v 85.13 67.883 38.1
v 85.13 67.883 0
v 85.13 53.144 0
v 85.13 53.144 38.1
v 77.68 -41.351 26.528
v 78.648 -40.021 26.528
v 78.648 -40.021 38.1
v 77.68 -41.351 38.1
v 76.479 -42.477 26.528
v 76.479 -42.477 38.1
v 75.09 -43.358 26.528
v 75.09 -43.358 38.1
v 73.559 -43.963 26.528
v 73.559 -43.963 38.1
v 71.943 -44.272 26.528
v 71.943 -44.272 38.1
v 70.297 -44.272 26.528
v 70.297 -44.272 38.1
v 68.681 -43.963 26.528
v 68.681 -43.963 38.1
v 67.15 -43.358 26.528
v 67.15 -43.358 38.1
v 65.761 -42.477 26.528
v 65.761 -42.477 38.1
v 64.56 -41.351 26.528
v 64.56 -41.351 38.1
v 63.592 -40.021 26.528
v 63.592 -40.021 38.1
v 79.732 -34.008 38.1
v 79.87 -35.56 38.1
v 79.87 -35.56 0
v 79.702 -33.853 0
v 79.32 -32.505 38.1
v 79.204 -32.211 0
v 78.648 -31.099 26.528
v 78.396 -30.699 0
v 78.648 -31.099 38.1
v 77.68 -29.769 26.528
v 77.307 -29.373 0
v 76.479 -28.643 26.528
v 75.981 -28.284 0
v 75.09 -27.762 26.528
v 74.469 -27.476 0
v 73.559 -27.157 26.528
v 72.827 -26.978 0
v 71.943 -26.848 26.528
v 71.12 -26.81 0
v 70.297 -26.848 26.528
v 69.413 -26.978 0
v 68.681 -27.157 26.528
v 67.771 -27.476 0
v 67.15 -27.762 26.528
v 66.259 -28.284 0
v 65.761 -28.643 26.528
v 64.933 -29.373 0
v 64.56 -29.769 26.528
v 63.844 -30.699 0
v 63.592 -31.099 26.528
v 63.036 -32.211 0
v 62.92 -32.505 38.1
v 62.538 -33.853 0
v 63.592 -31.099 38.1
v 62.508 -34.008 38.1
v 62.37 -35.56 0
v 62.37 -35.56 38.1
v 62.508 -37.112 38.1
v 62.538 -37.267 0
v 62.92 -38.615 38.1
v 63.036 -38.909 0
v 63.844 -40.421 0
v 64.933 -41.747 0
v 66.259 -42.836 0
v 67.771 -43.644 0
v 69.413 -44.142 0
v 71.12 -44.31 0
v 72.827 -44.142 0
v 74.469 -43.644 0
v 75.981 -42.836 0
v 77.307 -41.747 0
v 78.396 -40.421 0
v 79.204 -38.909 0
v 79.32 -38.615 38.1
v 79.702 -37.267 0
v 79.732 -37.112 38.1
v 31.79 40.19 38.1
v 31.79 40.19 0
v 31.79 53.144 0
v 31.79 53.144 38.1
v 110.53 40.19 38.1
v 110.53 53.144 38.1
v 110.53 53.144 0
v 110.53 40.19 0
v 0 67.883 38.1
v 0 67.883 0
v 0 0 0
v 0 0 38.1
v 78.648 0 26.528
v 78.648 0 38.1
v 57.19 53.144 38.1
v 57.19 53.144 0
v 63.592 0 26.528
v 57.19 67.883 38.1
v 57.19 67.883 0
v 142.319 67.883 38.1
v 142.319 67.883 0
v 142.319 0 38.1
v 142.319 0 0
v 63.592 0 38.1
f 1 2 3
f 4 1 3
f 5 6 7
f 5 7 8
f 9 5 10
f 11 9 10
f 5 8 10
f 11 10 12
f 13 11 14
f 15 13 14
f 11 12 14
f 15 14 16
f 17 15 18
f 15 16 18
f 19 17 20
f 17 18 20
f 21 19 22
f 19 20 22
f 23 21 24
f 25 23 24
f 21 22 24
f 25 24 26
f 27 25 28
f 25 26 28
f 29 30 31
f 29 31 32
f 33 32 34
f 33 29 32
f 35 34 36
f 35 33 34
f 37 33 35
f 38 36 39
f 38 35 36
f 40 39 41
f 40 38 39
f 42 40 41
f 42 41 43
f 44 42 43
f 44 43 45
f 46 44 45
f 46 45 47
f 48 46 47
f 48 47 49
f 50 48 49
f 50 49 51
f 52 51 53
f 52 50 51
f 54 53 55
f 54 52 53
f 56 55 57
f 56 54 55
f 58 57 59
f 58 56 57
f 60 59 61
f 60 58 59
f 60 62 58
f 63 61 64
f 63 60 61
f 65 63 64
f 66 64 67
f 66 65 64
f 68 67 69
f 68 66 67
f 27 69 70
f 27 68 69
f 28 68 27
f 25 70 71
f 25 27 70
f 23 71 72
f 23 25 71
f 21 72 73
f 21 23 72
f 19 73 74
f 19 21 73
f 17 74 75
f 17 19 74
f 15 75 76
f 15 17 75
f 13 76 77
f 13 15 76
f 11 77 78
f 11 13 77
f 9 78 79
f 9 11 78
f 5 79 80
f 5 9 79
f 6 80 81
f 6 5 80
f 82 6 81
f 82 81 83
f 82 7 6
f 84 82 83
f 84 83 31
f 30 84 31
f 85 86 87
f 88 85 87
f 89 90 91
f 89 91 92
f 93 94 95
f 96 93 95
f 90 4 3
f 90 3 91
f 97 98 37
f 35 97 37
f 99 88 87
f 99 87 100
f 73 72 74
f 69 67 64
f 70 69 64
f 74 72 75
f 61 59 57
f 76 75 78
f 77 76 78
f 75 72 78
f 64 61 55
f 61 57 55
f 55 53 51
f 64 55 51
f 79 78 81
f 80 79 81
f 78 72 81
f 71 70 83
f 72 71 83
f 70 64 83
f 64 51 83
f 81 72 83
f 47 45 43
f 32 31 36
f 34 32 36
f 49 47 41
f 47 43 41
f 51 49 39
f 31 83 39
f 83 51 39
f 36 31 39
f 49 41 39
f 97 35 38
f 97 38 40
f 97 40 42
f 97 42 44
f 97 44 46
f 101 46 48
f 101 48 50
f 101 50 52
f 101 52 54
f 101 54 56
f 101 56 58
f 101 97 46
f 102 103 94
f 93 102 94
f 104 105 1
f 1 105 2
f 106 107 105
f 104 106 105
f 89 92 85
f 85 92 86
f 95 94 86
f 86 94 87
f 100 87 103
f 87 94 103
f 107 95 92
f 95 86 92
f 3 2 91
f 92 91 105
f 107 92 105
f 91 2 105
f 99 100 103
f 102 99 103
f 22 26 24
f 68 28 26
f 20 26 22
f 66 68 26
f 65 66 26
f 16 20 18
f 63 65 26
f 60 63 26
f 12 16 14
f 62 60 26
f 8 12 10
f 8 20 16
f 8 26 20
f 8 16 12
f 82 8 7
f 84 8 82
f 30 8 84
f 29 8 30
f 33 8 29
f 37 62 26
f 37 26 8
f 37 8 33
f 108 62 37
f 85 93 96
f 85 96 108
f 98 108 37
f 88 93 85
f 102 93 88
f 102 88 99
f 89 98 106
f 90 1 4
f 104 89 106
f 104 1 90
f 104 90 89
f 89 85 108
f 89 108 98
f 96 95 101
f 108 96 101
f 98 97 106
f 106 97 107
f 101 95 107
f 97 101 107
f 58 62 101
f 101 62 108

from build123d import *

# Parameters (mm, degrees)
BOSS_EXTRUDE1_DEPTH = 38.1
SKETCH2_R           = 8.7503
BOSS_EXTRUDE2_DEPTH = 38.1
BOSS_EXTRUDE6_DEPTH = 11.572281197


with BuildPart() as part:
    # Sketch1 → Boss-Extrude1 (new body)
    with BuildSketch(Plane.XY):
        Polygon((0, 0), (142.319474343, 0), (142.319474343, 67.883016851), (85.129737171, 67.883016851), (85.129737171, 53.144138708), (110.529737171, 53.144138708), (110.529737171, 40.190138708), (31.789737171, 40.190138708), (31.789737171, 53.144138708), (57.189737171, 53.144138708), (57.189737171, 67.883016851), (0, 67.883016851), align=None)
    extrude(amount=BOSS_EXTRUDE1_DEPTH)



with BuildPart() as body_2:
    # Sketch2 → Boss-Extrude2 (new body)
    with BuildSketch(Plane.XY.offset(38.1)):
        with Locations((71.120000025, -35.559977798)):
            Circle(SKETCH2_R)
    extrude(amount=-BOSS_EXTRUDE2_DEPTH)


with BuildPart() as part_1:
    add(part.part)

    add(body_2.part)  # Boss-Extrude6 merges body 2
    # Sketch8 → Boss-Extrude6 (add)
    with BuildSketch(Plane.XY.offset(38.1)):
        with BuildLine():
            Line((63.59200581, -40.020589099), (63.59200581, 0))
            Line((63.59200581, 0), (78.647994227, 0))
            Line((78.647994227, 0), (78.647994227, -40.020589121))
            ThreePointArc((78.647994227, -40.020589121), (71.120000012, -44.310277798), (63.59200581, -40.020589099))
        make_face()
    extrude(amount=-BOSS_EXTRUDE6_DEPTH)


solid = part_1.part
